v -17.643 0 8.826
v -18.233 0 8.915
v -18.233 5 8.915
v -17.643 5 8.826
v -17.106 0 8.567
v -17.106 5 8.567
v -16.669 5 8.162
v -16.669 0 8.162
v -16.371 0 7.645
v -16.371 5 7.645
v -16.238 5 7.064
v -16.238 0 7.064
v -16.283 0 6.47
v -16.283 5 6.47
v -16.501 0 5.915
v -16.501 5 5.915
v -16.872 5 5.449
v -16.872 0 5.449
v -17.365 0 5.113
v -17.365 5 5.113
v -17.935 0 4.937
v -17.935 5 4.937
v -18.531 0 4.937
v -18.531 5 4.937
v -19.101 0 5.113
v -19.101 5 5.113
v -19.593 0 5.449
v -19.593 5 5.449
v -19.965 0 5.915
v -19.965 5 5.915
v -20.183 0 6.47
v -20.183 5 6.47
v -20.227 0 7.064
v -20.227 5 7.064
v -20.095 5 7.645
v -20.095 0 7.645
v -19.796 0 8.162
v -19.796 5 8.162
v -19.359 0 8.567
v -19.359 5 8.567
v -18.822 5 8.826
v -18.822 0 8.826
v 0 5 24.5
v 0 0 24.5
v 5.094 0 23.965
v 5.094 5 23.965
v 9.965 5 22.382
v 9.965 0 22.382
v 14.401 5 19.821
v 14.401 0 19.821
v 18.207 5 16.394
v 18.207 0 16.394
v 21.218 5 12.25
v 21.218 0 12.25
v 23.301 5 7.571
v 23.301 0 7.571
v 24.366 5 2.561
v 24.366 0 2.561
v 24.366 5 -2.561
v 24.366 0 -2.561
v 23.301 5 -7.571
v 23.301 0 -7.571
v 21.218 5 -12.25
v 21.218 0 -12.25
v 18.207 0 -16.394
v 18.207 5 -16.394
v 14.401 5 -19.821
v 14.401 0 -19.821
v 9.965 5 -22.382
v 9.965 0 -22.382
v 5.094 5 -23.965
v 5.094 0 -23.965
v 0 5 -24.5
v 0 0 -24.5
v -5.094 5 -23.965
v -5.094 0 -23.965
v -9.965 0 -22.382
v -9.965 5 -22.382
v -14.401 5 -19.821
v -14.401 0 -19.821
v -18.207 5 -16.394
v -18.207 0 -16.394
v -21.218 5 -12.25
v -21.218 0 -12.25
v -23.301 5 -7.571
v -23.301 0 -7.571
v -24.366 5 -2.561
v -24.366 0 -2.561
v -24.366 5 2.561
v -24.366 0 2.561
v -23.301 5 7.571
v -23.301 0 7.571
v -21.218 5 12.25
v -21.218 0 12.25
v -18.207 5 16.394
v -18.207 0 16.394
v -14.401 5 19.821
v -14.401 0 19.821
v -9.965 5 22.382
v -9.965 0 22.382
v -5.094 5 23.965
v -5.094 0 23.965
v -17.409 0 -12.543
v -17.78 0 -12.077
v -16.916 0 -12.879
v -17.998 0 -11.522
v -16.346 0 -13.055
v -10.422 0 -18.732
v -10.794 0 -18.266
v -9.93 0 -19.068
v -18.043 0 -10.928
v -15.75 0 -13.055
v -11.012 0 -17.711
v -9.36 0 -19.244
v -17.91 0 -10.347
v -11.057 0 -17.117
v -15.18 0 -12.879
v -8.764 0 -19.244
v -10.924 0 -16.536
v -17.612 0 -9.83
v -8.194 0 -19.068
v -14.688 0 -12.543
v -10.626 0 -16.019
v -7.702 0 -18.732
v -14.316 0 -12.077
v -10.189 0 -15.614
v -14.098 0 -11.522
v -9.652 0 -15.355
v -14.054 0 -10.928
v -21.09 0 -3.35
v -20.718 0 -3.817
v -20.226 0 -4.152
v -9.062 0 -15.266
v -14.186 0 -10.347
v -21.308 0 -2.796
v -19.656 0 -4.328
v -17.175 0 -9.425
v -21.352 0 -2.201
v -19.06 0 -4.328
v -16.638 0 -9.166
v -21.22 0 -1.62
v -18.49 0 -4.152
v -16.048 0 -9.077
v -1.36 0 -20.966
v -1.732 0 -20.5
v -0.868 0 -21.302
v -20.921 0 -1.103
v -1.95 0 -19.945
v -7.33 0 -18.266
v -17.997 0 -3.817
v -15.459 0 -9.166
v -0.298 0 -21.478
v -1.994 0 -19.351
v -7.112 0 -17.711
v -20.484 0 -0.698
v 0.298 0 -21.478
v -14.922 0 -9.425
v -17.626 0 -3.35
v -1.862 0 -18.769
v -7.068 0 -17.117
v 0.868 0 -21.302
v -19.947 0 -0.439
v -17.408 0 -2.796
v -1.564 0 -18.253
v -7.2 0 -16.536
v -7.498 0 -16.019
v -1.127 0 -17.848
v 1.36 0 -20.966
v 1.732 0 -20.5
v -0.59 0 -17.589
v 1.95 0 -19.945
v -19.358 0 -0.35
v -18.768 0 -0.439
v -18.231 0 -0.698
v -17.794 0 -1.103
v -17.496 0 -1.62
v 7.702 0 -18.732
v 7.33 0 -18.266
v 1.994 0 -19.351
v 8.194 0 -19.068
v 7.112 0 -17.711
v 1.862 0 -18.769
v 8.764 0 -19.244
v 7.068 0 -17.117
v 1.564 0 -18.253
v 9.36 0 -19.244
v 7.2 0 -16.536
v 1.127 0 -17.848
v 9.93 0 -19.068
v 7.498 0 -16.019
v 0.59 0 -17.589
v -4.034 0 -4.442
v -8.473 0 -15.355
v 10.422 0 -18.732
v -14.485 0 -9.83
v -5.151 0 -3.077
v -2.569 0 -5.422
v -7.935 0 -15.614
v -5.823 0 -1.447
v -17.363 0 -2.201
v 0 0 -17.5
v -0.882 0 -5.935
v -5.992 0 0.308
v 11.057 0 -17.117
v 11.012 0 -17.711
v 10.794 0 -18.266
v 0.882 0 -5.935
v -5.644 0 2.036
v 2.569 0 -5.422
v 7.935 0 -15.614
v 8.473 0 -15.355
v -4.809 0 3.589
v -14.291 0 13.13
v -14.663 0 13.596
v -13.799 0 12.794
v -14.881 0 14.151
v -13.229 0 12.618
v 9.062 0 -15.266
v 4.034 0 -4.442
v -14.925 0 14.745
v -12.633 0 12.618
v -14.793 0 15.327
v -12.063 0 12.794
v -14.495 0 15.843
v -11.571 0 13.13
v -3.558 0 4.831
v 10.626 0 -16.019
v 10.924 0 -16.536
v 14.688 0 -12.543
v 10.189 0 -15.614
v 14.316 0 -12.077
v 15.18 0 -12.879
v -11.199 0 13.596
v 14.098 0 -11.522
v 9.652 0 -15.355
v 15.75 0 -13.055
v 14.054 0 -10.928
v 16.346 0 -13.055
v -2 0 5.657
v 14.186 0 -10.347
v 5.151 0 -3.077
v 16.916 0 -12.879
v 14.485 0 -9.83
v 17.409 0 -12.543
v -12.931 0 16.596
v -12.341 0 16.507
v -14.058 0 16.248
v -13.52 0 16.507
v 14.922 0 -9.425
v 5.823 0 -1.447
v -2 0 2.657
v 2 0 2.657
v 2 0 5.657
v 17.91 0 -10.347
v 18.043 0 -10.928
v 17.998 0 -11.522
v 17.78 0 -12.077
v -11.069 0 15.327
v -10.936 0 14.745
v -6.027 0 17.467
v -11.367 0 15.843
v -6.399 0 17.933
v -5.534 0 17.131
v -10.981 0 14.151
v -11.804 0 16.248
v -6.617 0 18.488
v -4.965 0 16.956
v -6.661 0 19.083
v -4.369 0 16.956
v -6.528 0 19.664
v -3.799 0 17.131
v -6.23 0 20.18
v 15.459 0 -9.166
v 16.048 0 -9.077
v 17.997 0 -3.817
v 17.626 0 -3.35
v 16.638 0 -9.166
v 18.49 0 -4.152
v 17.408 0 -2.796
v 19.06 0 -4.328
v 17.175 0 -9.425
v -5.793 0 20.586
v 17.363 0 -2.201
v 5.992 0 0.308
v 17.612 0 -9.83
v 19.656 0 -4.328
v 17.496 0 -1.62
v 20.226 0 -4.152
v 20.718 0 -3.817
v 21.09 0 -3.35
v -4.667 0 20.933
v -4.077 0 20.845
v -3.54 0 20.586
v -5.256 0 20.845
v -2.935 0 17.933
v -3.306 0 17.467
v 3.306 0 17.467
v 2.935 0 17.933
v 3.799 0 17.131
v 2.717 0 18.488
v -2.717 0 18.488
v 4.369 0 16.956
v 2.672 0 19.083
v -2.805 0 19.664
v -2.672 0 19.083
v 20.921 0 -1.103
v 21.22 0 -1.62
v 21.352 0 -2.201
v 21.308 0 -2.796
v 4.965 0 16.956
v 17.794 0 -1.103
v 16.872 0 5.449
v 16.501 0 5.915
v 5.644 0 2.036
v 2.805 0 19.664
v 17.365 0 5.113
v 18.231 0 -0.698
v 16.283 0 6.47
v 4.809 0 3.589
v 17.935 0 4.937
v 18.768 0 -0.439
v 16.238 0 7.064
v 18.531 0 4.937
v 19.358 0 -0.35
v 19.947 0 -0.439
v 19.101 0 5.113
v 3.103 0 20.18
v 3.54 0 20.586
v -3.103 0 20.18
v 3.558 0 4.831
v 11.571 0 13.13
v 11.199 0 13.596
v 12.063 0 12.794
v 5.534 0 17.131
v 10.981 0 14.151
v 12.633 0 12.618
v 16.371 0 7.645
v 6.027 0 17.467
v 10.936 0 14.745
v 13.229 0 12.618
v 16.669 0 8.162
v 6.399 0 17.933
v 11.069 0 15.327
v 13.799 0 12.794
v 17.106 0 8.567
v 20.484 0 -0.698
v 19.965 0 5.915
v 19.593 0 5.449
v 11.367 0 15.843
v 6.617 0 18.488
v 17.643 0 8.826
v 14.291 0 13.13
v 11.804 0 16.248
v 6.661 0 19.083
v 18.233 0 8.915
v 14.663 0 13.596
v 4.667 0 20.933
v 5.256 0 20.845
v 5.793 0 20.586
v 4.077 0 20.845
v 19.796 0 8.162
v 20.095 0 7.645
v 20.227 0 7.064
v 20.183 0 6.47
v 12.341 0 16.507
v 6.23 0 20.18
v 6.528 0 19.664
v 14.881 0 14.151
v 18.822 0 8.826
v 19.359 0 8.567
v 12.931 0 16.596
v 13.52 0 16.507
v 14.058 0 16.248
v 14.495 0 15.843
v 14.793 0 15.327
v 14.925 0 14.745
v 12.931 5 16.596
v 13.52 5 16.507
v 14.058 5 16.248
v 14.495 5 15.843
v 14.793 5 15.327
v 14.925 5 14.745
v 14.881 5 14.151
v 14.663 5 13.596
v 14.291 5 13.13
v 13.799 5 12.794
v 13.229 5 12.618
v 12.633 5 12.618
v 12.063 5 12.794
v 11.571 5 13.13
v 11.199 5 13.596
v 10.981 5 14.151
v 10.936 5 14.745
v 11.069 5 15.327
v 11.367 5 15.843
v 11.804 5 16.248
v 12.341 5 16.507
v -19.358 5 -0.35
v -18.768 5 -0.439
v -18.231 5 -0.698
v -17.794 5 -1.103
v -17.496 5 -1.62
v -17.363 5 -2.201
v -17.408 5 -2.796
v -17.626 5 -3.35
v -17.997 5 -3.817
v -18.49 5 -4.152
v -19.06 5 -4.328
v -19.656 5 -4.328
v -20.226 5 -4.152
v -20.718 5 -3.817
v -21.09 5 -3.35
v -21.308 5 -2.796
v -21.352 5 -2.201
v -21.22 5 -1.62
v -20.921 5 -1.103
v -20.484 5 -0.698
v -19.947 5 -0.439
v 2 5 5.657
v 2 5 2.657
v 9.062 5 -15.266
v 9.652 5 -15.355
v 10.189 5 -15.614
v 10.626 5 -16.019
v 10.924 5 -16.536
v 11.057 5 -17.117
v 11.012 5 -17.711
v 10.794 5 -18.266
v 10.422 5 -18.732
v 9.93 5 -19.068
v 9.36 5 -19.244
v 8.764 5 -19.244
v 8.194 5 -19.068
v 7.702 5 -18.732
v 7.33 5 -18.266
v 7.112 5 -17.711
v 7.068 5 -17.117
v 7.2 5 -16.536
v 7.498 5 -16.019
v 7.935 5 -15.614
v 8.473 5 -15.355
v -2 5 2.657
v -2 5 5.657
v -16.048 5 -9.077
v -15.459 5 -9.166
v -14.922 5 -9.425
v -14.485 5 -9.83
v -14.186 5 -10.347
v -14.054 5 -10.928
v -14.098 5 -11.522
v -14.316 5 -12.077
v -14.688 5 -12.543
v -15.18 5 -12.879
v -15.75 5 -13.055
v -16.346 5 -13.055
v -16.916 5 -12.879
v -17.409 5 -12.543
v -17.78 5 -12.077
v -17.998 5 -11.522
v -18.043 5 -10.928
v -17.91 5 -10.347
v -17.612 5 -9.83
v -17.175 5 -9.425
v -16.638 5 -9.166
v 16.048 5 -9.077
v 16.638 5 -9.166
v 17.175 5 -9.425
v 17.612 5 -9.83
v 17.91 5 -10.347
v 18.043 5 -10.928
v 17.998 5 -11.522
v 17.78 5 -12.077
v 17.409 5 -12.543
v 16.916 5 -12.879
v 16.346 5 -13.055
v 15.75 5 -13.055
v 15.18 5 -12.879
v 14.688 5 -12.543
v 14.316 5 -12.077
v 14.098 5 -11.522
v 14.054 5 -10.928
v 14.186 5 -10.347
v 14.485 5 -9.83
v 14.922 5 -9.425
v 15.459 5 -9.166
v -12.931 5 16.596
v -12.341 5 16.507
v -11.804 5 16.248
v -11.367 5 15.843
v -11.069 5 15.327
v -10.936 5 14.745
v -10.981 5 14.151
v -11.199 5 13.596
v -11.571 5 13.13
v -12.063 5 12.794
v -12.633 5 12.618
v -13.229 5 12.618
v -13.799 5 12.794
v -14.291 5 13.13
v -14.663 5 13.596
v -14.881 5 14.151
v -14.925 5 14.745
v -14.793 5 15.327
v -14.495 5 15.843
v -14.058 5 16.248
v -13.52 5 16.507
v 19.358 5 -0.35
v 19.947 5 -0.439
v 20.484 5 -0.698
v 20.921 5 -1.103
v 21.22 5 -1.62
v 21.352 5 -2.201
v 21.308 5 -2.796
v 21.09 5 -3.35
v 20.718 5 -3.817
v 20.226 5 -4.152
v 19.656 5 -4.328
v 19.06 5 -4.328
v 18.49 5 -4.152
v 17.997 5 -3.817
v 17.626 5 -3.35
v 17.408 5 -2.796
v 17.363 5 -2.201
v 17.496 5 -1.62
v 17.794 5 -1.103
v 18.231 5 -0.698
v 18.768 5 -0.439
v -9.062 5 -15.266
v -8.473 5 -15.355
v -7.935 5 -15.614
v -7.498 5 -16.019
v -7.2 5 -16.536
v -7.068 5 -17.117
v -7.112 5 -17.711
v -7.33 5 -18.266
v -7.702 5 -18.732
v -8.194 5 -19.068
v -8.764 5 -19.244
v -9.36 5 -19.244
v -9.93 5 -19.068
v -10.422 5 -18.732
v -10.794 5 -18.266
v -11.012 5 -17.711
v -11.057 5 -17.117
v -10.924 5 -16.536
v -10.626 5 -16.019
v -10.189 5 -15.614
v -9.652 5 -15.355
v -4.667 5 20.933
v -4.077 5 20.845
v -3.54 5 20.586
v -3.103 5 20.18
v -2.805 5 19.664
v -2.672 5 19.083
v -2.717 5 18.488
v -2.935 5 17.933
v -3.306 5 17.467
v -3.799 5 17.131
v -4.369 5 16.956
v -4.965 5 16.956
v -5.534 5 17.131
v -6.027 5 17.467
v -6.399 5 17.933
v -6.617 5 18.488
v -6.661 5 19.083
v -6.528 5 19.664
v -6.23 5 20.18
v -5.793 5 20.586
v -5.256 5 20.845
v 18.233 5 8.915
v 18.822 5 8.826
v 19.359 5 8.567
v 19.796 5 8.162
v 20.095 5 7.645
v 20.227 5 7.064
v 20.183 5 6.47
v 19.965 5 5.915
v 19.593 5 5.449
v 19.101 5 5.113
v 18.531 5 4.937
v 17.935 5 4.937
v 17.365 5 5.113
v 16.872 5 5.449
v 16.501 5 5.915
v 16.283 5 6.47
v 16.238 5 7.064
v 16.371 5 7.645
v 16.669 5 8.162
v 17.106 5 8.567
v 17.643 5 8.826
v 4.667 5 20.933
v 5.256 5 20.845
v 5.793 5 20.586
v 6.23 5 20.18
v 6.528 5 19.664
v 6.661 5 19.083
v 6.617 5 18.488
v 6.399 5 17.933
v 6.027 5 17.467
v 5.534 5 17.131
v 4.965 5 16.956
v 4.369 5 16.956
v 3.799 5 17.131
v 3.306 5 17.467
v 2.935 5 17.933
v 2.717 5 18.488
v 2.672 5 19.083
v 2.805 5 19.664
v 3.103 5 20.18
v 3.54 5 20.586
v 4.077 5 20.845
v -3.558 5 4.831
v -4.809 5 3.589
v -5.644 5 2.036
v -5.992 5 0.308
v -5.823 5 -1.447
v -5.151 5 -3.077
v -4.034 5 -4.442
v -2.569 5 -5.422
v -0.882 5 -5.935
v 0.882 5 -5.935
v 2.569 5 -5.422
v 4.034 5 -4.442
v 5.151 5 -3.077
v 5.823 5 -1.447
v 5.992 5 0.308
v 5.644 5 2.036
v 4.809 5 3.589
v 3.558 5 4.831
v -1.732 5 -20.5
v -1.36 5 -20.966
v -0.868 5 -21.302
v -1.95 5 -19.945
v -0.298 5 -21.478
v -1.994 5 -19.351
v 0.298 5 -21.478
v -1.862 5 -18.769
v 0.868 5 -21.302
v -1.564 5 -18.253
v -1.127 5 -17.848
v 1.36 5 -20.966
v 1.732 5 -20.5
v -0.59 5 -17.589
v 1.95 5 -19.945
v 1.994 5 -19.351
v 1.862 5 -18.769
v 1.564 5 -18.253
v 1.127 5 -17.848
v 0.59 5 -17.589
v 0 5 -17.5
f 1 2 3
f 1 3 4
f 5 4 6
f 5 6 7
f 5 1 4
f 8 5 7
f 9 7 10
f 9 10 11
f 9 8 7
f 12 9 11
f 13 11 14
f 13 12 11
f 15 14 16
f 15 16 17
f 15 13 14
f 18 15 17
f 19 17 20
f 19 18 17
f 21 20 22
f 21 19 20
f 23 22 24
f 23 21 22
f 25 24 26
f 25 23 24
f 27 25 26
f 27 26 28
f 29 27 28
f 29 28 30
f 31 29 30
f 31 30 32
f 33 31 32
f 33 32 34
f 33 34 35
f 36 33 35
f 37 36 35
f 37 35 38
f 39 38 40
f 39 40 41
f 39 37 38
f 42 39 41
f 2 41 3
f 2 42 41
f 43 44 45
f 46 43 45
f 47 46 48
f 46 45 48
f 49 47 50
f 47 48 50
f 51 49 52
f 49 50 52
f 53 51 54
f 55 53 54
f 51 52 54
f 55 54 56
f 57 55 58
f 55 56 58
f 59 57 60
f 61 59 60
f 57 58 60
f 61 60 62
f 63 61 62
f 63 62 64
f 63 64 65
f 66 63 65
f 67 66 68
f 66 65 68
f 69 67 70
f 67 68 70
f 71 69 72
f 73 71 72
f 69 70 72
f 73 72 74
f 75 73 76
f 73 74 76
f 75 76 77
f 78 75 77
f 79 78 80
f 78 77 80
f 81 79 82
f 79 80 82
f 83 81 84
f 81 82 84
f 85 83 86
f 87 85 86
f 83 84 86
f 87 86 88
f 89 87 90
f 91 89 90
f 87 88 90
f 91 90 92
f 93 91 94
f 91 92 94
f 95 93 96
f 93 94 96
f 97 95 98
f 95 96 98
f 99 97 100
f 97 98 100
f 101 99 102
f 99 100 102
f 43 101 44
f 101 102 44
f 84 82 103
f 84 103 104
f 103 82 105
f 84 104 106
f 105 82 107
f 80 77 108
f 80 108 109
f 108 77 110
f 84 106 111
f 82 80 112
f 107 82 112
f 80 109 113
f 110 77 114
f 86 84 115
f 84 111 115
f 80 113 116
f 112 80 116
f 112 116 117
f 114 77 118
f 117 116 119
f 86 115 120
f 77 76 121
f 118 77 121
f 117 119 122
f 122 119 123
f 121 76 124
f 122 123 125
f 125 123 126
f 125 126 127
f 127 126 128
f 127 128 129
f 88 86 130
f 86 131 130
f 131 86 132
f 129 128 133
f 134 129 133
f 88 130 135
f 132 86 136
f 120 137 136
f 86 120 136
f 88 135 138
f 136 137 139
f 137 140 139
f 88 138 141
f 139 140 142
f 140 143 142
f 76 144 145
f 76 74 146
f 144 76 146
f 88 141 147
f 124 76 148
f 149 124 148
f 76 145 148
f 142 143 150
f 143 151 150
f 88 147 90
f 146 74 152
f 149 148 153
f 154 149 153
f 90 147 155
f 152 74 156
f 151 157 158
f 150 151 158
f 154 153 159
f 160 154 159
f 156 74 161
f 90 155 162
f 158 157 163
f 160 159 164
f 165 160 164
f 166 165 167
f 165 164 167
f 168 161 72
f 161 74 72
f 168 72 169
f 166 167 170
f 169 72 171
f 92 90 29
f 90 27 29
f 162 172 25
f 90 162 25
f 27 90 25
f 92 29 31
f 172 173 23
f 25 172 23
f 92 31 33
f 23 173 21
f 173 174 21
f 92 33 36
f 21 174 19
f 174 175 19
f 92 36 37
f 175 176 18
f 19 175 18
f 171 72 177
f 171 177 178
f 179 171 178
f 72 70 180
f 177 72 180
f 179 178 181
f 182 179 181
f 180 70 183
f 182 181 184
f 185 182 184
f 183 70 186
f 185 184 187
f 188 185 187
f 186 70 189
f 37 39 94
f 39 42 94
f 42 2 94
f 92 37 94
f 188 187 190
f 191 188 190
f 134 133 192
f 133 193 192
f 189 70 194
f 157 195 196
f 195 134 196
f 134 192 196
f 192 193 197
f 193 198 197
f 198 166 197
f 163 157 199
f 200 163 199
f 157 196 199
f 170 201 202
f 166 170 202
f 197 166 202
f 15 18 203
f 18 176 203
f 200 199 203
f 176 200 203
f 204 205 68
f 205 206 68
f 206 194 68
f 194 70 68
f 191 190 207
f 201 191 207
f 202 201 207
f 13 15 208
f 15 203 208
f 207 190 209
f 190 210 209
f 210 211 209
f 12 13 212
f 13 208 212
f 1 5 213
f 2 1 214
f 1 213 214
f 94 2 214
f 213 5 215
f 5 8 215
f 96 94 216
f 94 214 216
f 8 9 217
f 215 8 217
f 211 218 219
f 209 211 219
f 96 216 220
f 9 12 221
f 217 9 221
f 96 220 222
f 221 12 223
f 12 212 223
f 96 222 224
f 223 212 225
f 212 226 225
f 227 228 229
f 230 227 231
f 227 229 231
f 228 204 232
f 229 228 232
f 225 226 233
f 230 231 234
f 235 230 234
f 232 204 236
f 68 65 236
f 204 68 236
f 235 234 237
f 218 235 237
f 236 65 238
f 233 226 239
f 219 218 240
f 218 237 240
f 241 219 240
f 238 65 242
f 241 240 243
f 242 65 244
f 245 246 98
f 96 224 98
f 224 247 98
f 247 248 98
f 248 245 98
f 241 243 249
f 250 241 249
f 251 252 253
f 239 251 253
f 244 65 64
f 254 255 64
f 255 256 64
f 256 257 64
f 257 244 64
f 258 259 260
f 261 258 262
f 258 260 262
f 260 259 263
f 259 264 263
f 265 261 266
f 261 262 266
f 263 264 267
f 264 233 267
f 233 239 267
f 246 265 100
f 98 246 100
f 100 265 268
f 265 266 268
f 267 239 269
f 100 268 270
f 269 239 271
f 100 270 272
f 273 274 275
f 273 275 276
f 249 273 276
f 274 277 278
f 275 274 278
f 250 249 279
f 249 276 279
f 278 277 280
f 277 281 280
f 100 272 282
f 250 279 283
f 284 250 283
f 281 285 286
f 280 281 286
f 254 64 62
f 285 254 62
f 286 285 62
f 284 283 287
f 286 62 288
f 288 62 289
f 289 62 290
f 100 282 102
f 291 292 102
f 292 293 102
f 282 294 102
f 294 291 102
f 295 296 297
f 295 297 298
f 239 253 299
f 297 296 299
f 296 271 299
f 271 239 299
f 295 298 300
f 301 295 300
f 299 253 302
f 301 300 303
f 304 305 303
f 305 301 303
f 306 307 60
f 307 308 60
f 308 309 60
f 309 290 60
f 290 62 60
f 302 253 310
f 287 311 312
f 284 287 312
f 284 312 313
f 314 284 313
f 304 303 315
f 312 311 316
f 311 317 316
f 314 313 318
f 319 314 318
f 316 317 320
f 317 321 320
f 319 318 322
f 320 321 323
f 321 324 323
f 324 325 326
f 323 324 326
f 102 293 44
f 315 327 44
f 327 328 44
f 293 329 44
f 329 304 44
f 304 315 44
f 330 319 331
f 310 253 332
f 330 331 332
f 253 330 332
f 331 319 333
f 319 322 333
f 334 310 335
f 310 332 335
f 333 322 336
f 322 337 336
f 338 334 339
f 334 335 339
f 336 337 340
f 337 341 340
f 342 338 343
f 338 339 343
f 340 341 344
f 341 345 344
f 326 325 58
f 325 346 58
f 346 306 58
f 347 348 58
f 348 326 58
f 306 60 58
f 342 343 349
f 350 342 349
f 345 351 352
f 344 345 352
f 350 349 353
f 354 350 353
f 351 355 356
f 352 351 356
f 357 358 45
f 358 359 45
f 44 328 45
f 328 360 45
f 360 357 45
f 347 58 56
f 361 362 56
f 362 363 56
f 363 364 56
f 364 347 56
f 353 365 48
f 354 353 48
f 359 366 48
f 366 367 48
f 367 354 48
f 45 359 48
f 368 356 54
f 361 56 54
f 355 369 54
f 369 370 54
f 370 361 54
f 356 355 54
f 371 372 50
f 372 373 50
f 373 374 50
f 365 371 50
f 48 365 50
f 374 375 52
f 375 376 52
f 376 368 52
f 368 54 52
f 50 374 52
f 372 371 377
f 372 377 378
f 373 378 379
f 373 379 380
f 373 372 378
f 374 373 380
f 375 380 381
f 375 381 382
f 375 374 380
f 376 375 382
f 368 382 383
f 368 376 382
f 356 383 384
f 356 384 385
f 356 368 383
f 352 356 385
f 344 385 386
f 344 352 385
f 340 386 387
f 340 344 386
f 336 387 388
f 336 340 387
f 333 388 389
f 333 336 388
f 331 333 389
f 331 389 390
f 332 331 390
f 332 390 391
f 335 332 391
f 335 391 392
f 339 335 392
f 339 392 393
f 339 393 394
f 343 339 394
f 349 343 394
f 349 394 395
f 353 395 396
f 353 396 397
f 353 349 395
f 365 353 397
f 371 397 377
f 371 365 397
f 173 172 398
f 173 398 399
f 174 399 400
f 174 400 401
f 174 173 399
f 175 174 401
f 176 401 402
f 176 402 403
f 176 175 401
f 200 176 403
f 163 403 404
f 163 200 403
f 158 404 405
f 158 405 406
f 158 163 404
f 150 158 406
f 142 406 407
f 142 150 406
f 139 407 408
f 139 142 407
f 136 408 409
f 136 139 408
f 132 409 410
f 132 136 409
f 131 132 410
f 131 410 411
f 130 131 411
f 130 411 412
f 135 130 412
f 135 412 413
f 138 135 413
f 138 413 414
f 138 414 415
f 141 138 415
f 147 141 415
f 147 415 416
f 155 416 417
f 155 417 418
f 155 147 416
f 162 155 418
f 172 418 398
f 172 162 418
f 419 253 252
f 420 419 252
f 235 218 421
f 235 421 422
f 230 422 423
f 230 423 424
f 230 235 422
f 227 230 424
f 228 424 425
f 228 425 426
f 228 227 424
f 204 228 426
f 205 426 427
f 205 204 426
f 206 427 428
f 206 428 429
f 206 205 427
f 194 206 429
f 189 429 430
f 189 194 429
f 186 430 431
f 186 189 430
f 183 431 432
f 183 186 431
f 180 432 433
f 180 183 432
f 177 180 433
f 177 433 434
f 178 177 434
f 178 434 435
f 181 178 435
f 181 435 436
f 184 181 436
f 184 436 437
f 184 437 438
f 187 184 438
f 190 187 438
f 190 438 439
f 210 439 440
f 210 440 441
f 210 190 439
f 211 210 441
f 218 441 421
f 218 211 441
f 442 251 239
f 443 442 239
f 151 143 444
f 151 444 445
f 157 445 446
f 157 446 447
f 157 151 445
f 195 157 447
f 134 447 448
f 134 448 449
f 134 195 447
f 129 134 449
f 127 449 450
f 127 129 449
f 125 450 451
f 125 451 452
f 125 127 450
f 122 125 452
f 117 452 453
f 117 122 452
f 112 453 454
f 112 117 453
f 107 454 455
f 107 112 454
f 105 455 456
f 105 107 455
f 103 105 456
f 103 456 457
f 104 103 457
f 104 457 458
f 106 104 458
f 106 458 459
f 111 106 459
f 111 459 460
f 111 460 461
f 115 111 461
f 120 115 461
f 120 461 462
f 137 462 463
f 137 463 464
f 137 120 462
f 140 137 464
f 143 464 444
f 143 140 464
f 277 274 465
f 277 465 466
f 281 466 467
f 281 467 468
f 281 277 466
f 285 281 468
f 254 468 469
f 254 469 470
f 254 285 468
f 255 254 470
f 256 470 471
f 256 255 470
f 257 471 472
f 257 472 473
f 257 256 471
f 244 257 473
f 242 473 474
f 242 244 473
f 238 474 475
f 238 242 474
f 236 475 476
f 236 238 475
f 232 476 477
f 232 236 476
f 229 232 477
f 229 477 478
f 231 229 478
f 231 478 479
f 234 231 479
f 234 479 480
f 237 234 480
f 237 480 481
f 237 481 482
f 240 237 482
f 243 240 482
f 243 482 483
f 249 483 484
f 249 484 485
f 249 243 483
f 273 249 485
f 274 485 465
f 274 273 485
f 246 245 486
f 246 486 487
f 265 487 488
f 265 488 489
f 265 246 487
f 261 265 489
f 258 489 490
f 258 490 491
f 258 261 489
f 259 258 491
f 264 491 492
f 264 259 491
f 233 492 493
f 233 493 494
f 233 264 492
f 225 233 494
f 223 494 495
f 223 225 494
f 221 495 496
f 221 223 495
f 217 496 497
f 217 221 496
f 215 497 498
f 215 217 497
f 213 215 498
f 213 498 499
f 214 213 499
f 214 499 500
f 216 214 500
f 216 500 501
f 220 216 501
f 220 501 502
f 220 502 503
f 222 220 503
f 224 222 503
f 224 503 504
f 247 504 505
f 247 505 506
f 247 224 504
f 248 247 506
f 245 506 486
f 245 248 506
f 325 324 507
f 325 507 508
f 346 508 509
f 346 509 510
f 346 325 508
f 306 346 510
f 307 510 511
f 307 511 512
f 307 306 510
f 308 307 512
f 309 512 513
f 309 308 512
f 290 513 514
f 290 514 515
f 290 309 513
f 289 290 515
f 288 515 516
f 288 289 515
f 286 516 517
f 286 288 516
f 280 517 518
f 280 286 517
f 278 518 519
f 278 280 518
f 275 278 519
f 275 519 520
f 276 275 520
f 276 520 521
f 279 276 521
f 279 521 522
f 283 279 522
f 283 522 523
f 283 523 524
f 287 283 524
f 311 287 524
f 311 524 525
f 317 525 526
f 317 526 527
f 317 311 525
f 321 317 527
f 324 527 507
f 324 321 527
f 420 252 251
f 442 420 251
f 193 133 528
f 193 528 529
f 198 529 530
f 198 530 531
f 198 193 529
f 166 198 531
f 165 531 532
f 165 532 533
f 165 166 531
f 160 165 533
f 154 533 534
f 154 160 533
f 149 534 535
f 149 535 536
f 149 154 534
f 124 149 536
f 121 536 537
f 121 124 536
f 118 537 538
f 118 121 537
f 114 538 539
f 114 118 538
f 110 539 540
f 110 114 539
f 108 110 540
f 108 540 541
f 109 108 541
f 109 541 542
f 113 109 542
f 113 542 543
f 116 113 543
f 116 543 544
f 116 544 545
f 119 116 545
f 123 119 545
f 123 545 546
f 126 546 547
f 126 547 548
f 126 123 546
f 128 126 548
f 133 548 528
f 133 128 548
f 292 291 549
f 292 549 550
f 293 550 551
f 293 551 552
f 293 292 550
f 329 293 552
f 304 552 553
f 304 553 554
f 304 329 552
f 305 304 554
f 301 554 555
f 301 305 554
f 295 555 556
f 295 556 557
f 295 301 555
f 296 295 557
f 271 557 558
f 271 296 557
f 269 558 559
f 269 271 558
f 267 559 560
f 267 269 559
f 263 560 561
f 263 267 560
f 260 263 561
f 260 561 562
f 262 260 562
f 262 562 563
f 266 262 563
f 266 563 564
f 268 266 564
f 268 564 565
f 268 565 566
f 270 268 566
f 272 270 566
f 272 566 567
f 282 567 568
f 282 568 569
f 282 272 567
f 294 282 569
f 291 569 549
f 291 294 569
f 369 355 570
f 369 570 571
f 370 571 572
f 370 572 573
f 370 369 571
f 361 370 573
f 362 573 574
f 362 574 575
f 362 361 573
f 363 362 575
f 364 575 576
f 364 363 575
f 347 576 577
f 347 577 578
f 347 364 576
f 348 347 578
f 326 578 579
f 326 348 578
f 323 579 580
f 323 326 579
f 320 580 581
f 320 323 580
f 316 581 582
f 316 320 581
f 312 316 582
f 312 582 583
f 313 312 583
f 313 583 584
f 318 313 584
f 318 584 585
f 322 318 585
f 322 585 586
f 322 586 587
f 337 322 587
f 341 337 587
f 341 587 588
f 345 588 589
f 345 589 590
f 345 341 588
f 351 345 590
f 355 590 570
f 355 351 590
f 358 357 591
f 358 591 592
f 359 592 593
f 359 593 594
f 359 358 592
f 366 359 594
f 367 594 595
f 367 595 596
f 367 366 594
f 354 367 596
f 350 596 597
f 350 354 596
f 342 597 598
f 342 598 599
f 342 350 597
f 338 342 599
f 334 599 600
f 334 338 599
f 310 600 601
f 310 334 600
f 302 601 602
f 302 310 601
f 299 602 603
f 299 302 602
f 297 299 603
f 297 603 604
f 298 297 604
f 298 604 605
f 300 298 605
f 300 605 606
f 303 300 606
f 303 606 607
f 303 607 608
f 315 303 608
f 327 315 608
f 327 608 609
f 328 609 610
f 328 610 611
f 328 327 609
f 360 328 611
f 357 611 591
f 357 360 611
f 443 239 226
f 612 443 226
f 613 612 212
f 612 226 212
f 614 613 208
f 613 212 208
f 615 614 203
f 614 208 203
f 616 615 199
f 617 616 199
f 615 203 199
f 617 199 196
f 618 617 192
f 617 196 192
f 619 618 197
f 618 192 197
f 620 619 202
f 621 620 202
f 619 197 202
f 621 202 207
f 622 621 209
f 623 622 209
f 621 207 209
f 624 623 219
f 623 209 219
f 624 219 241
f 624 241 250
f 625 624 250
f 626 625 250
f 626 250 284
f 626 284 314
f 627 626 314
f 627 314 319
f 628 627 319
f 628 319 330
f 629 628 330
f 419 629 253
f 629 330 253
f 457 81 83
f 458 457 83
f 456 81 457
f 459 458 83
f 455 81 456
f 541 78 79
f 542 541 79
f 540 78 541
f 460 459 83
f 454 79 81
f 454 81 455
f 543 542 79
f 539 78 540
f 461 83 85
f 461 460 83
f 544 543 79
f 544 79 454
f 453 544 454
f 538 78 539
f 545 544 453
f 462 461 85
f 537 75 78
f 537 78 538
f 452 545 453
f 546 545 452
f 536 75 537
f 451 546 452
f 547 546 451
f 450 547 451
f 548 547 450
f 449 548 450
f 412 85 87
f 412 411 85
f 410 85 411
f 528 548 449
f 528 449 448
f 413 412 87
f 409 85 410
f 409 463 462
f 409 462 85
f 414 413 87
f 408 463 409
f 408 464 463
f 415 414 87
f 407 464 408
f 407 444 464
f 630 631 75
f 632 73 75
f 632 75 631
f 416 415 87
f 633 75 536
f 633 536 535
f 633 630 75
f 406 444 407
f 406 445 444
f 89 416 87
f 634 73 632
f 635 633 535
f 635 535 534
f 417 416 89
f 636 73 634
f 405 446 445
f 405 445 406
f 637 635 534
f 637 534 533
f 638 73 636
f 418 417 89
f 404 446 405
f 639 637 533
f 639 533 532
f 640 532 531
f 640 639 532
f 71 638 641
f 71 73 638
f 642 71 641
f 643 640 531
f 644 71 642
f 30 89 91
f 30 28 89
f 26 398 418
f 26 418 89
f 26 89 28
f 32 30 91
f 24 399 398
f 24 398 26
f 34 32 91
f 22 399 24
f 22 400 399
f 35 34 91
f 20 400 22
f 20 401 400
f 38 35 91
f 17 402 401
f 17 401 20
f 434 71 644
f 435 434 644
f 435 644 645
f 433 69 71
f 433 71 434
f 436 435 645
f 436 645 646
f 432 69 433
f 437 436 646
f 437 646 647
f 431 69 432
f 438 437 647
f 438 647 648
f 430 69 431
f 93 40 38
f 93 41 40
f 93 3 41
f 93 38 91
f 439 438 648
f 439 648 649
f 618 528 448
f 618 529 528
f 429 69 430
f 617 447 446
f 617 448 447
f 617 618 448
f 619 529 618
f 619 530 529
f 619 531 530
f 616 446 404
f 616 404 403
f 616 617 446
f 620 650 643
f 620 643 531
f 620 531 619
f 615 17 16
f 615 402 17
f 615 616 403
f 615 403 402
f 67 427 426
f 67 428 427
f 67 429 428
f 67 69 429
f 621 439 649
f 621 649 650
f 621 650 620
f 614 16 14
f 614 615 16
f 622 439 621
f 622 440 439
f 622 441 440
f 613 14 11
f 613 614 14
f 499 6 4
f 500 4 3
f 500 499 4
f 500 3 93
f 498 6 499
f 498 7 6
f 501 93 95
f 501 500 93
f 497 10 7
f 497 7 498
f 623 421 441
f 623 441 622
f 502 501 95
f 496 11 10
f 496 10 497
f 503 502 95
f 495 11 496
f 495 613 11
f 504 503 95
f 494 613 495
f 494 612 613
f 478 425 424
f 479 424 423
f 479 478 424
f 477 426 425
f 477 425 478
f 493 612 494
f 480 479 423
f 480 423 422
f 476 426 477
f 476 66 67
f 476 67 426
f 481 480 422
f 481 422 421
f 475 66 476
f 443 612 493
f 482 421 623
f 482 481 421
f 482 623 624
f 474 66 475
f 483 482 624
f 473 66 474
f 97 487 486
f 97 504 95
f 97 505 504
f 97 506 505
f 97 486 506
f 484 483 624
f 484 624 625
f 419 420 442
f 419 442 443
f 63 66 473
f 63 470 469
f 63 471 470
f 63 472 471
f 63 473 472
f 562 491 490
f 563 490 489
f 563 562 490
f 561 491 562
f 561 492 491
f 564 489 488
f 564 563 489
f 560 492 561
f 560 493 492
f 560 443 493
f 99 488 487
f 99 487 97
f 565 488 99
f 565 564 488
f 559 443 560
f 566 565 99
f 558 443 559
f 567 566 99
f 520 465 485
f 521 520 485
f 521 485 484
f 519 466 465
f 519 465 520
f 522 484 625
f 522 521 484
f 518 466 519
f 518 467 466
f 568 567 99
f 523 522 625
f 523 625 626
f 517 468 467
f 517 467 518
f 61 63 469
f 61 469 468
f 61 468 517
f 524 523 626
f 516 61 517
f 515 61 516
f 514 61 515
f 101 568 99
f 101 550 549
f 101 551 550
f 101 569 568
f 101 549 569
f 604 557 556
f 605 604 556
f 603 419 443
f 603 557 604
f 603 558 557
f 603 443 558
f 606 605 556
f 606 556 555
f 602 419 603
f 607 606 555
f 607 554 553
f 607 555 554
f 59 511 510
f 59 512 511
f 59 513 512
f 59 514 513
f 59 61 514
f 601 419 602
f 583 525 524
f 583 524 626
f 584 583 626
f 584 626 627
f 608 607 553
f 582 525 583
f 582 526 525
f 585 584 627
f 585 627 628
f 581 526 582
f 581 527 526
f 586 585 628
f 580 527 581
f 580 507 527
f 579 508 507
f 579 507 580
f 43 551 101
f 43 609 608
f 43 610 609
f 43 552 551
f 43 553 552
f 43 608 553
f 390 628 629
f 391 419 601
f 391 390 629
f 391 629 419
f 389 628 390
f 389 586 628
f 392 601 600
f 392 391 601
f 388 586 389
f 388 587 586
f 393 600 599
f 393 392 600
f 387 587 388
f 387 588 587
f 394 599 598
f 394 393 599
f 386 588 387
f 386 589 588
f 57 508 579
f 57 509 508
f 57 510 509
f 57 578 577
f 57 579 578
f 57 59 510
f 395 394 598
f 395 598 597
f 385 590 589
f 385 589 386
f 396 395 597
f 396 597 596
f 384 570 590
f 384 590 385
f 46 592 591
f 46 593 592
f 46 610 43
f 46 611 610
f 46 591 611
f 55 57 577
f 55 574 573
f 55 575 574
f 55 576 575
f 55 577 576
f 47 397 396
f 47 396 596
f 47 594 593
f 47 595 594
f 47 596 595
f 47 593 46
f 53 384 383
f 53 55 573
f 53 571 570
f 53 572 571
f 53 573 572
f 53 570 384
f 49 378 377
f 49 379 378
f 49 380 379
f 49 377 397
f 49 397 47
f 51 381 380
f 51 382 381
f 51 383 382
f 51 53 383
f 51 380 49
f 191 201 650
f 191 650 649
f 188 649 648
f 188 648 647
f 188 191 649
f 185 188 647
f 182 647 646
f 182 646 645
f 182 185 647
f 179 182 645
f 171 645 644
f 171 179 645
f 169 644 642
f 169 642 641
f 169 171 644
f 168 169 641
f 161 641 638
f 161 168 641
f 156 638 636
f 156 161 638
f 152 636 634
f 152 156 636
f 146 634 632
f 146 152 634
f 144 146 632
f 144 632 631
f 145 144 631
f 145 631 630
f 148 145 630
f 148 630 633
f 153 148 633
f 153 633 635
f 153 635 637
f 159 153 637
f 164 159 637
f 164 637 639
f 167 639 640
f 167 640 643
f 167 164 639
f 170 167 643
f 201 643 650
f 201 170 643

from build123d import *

# Parameters (mm, degrees)
SKETCH1_R           = 24.5
SKETCH1_R_2         = 2
BOSS_EXTRUDE1_DEPTH = 5


with BuildPart() as part:
    # Sketch1 → Boss-Extrude1 (new body)
    with BuildSketch(Plane(origin=(0, 0, 0), x_dir=(1, 0, 0), z_dir=(0, 1, 0))):
        with Locations(Location((0, 0, 0), (0, 0, 270))):
            Circle(SKETCH1_R)
        with Locations(Location((0, 19.5, 0), (0, 0, 270))):
            Circle(SKETCH1_R_2, mode=Mode.SUBTRACT)
        with Locations(Location((9.062101855, 17.2663925, 0), (0, 0, 270))):
            Circle(SKETCH1_R_2, mode=Mode.SUBTRACT)
        with Locations(Location((16.048185385, 11.077262561, 0), (0, 0, 270))):
            Circle(SKETCH1_R_2, mode=Mode.SUBTRACT)
        with Locations(Location((19.357823045, 2.350465265, 0), (0, 0, 270))):
            Circle(SKETCH1_R_2, mode=Mode.SUBTRACT)
        with Locations(Location((18.232816732, -6.914795297, 0), (0, 0, 270))):
            Circle(SKETCH1_R_2, mode=Mode.SUBTRACT)
        with Locations(Location((12.930891836, -14.595959589, 0), (0, 0, 270))):
            Circle(SKETCH1_R_2, mode=Mode.SUBTRACT)
        with Locations(Location((4.666655454, -18.93336544, 0), (0, 0, 270))):
            Circle(SKETCH1_R_2, mode=Mode.SUBTRACT)
        with Locations(Location((-4.666655454, -18.93336544, 0), (0, 0, 270))):
            Circle(SKETCH1_R_2, mode=Mode.SUBTRACT)
        with Locations(Location((-12.930891836, -14.595959589, 0), (0, 0, 270))):
            Circle(SKETCH1_R_2, mode=Mode.SUBTRACT)
        with Locations(Location((-18.232816732, -6.914795297, 0), (0, 0, 270))):
            Circle(SKETCH1_R_2, mode=Mode.SUBTRACT)
        with Locations(Location((-19.357823045, 2.350465265, 0), (0, 0, 270))):
            Circle(SKETCH1_R_2, mode=Mode.SUBTRACT)
        with Locations(Location((-16.048185385, 11.077262561, 0), (0, 0, 270))):
            Circle(SKETCH1_R_2, mode=Mode.SUBTRACT)
        with Locations(Location((-9.062101855, 17.2663925, 0), (0, 0, 270))):
            Circle(SKETCH1_R_2, mode=Mode.SUBTRACT)
        with BuildLine():
            Line((2, -5.656854249), (2, -2.656854249))
            Line((2, -2.656854249), (-2, -2.656854249))
            Line((-2, -2.656854249), (-2, -5.656854249))
            ThreePointArc((-2, -5.656854249), (0, 6), (2, -5.656854249))
        make_face(mode=Mode.SUBTRACT)
    extrude(amount=BOSS_EXTRUDE1_DEPTH)


solid = part.part
